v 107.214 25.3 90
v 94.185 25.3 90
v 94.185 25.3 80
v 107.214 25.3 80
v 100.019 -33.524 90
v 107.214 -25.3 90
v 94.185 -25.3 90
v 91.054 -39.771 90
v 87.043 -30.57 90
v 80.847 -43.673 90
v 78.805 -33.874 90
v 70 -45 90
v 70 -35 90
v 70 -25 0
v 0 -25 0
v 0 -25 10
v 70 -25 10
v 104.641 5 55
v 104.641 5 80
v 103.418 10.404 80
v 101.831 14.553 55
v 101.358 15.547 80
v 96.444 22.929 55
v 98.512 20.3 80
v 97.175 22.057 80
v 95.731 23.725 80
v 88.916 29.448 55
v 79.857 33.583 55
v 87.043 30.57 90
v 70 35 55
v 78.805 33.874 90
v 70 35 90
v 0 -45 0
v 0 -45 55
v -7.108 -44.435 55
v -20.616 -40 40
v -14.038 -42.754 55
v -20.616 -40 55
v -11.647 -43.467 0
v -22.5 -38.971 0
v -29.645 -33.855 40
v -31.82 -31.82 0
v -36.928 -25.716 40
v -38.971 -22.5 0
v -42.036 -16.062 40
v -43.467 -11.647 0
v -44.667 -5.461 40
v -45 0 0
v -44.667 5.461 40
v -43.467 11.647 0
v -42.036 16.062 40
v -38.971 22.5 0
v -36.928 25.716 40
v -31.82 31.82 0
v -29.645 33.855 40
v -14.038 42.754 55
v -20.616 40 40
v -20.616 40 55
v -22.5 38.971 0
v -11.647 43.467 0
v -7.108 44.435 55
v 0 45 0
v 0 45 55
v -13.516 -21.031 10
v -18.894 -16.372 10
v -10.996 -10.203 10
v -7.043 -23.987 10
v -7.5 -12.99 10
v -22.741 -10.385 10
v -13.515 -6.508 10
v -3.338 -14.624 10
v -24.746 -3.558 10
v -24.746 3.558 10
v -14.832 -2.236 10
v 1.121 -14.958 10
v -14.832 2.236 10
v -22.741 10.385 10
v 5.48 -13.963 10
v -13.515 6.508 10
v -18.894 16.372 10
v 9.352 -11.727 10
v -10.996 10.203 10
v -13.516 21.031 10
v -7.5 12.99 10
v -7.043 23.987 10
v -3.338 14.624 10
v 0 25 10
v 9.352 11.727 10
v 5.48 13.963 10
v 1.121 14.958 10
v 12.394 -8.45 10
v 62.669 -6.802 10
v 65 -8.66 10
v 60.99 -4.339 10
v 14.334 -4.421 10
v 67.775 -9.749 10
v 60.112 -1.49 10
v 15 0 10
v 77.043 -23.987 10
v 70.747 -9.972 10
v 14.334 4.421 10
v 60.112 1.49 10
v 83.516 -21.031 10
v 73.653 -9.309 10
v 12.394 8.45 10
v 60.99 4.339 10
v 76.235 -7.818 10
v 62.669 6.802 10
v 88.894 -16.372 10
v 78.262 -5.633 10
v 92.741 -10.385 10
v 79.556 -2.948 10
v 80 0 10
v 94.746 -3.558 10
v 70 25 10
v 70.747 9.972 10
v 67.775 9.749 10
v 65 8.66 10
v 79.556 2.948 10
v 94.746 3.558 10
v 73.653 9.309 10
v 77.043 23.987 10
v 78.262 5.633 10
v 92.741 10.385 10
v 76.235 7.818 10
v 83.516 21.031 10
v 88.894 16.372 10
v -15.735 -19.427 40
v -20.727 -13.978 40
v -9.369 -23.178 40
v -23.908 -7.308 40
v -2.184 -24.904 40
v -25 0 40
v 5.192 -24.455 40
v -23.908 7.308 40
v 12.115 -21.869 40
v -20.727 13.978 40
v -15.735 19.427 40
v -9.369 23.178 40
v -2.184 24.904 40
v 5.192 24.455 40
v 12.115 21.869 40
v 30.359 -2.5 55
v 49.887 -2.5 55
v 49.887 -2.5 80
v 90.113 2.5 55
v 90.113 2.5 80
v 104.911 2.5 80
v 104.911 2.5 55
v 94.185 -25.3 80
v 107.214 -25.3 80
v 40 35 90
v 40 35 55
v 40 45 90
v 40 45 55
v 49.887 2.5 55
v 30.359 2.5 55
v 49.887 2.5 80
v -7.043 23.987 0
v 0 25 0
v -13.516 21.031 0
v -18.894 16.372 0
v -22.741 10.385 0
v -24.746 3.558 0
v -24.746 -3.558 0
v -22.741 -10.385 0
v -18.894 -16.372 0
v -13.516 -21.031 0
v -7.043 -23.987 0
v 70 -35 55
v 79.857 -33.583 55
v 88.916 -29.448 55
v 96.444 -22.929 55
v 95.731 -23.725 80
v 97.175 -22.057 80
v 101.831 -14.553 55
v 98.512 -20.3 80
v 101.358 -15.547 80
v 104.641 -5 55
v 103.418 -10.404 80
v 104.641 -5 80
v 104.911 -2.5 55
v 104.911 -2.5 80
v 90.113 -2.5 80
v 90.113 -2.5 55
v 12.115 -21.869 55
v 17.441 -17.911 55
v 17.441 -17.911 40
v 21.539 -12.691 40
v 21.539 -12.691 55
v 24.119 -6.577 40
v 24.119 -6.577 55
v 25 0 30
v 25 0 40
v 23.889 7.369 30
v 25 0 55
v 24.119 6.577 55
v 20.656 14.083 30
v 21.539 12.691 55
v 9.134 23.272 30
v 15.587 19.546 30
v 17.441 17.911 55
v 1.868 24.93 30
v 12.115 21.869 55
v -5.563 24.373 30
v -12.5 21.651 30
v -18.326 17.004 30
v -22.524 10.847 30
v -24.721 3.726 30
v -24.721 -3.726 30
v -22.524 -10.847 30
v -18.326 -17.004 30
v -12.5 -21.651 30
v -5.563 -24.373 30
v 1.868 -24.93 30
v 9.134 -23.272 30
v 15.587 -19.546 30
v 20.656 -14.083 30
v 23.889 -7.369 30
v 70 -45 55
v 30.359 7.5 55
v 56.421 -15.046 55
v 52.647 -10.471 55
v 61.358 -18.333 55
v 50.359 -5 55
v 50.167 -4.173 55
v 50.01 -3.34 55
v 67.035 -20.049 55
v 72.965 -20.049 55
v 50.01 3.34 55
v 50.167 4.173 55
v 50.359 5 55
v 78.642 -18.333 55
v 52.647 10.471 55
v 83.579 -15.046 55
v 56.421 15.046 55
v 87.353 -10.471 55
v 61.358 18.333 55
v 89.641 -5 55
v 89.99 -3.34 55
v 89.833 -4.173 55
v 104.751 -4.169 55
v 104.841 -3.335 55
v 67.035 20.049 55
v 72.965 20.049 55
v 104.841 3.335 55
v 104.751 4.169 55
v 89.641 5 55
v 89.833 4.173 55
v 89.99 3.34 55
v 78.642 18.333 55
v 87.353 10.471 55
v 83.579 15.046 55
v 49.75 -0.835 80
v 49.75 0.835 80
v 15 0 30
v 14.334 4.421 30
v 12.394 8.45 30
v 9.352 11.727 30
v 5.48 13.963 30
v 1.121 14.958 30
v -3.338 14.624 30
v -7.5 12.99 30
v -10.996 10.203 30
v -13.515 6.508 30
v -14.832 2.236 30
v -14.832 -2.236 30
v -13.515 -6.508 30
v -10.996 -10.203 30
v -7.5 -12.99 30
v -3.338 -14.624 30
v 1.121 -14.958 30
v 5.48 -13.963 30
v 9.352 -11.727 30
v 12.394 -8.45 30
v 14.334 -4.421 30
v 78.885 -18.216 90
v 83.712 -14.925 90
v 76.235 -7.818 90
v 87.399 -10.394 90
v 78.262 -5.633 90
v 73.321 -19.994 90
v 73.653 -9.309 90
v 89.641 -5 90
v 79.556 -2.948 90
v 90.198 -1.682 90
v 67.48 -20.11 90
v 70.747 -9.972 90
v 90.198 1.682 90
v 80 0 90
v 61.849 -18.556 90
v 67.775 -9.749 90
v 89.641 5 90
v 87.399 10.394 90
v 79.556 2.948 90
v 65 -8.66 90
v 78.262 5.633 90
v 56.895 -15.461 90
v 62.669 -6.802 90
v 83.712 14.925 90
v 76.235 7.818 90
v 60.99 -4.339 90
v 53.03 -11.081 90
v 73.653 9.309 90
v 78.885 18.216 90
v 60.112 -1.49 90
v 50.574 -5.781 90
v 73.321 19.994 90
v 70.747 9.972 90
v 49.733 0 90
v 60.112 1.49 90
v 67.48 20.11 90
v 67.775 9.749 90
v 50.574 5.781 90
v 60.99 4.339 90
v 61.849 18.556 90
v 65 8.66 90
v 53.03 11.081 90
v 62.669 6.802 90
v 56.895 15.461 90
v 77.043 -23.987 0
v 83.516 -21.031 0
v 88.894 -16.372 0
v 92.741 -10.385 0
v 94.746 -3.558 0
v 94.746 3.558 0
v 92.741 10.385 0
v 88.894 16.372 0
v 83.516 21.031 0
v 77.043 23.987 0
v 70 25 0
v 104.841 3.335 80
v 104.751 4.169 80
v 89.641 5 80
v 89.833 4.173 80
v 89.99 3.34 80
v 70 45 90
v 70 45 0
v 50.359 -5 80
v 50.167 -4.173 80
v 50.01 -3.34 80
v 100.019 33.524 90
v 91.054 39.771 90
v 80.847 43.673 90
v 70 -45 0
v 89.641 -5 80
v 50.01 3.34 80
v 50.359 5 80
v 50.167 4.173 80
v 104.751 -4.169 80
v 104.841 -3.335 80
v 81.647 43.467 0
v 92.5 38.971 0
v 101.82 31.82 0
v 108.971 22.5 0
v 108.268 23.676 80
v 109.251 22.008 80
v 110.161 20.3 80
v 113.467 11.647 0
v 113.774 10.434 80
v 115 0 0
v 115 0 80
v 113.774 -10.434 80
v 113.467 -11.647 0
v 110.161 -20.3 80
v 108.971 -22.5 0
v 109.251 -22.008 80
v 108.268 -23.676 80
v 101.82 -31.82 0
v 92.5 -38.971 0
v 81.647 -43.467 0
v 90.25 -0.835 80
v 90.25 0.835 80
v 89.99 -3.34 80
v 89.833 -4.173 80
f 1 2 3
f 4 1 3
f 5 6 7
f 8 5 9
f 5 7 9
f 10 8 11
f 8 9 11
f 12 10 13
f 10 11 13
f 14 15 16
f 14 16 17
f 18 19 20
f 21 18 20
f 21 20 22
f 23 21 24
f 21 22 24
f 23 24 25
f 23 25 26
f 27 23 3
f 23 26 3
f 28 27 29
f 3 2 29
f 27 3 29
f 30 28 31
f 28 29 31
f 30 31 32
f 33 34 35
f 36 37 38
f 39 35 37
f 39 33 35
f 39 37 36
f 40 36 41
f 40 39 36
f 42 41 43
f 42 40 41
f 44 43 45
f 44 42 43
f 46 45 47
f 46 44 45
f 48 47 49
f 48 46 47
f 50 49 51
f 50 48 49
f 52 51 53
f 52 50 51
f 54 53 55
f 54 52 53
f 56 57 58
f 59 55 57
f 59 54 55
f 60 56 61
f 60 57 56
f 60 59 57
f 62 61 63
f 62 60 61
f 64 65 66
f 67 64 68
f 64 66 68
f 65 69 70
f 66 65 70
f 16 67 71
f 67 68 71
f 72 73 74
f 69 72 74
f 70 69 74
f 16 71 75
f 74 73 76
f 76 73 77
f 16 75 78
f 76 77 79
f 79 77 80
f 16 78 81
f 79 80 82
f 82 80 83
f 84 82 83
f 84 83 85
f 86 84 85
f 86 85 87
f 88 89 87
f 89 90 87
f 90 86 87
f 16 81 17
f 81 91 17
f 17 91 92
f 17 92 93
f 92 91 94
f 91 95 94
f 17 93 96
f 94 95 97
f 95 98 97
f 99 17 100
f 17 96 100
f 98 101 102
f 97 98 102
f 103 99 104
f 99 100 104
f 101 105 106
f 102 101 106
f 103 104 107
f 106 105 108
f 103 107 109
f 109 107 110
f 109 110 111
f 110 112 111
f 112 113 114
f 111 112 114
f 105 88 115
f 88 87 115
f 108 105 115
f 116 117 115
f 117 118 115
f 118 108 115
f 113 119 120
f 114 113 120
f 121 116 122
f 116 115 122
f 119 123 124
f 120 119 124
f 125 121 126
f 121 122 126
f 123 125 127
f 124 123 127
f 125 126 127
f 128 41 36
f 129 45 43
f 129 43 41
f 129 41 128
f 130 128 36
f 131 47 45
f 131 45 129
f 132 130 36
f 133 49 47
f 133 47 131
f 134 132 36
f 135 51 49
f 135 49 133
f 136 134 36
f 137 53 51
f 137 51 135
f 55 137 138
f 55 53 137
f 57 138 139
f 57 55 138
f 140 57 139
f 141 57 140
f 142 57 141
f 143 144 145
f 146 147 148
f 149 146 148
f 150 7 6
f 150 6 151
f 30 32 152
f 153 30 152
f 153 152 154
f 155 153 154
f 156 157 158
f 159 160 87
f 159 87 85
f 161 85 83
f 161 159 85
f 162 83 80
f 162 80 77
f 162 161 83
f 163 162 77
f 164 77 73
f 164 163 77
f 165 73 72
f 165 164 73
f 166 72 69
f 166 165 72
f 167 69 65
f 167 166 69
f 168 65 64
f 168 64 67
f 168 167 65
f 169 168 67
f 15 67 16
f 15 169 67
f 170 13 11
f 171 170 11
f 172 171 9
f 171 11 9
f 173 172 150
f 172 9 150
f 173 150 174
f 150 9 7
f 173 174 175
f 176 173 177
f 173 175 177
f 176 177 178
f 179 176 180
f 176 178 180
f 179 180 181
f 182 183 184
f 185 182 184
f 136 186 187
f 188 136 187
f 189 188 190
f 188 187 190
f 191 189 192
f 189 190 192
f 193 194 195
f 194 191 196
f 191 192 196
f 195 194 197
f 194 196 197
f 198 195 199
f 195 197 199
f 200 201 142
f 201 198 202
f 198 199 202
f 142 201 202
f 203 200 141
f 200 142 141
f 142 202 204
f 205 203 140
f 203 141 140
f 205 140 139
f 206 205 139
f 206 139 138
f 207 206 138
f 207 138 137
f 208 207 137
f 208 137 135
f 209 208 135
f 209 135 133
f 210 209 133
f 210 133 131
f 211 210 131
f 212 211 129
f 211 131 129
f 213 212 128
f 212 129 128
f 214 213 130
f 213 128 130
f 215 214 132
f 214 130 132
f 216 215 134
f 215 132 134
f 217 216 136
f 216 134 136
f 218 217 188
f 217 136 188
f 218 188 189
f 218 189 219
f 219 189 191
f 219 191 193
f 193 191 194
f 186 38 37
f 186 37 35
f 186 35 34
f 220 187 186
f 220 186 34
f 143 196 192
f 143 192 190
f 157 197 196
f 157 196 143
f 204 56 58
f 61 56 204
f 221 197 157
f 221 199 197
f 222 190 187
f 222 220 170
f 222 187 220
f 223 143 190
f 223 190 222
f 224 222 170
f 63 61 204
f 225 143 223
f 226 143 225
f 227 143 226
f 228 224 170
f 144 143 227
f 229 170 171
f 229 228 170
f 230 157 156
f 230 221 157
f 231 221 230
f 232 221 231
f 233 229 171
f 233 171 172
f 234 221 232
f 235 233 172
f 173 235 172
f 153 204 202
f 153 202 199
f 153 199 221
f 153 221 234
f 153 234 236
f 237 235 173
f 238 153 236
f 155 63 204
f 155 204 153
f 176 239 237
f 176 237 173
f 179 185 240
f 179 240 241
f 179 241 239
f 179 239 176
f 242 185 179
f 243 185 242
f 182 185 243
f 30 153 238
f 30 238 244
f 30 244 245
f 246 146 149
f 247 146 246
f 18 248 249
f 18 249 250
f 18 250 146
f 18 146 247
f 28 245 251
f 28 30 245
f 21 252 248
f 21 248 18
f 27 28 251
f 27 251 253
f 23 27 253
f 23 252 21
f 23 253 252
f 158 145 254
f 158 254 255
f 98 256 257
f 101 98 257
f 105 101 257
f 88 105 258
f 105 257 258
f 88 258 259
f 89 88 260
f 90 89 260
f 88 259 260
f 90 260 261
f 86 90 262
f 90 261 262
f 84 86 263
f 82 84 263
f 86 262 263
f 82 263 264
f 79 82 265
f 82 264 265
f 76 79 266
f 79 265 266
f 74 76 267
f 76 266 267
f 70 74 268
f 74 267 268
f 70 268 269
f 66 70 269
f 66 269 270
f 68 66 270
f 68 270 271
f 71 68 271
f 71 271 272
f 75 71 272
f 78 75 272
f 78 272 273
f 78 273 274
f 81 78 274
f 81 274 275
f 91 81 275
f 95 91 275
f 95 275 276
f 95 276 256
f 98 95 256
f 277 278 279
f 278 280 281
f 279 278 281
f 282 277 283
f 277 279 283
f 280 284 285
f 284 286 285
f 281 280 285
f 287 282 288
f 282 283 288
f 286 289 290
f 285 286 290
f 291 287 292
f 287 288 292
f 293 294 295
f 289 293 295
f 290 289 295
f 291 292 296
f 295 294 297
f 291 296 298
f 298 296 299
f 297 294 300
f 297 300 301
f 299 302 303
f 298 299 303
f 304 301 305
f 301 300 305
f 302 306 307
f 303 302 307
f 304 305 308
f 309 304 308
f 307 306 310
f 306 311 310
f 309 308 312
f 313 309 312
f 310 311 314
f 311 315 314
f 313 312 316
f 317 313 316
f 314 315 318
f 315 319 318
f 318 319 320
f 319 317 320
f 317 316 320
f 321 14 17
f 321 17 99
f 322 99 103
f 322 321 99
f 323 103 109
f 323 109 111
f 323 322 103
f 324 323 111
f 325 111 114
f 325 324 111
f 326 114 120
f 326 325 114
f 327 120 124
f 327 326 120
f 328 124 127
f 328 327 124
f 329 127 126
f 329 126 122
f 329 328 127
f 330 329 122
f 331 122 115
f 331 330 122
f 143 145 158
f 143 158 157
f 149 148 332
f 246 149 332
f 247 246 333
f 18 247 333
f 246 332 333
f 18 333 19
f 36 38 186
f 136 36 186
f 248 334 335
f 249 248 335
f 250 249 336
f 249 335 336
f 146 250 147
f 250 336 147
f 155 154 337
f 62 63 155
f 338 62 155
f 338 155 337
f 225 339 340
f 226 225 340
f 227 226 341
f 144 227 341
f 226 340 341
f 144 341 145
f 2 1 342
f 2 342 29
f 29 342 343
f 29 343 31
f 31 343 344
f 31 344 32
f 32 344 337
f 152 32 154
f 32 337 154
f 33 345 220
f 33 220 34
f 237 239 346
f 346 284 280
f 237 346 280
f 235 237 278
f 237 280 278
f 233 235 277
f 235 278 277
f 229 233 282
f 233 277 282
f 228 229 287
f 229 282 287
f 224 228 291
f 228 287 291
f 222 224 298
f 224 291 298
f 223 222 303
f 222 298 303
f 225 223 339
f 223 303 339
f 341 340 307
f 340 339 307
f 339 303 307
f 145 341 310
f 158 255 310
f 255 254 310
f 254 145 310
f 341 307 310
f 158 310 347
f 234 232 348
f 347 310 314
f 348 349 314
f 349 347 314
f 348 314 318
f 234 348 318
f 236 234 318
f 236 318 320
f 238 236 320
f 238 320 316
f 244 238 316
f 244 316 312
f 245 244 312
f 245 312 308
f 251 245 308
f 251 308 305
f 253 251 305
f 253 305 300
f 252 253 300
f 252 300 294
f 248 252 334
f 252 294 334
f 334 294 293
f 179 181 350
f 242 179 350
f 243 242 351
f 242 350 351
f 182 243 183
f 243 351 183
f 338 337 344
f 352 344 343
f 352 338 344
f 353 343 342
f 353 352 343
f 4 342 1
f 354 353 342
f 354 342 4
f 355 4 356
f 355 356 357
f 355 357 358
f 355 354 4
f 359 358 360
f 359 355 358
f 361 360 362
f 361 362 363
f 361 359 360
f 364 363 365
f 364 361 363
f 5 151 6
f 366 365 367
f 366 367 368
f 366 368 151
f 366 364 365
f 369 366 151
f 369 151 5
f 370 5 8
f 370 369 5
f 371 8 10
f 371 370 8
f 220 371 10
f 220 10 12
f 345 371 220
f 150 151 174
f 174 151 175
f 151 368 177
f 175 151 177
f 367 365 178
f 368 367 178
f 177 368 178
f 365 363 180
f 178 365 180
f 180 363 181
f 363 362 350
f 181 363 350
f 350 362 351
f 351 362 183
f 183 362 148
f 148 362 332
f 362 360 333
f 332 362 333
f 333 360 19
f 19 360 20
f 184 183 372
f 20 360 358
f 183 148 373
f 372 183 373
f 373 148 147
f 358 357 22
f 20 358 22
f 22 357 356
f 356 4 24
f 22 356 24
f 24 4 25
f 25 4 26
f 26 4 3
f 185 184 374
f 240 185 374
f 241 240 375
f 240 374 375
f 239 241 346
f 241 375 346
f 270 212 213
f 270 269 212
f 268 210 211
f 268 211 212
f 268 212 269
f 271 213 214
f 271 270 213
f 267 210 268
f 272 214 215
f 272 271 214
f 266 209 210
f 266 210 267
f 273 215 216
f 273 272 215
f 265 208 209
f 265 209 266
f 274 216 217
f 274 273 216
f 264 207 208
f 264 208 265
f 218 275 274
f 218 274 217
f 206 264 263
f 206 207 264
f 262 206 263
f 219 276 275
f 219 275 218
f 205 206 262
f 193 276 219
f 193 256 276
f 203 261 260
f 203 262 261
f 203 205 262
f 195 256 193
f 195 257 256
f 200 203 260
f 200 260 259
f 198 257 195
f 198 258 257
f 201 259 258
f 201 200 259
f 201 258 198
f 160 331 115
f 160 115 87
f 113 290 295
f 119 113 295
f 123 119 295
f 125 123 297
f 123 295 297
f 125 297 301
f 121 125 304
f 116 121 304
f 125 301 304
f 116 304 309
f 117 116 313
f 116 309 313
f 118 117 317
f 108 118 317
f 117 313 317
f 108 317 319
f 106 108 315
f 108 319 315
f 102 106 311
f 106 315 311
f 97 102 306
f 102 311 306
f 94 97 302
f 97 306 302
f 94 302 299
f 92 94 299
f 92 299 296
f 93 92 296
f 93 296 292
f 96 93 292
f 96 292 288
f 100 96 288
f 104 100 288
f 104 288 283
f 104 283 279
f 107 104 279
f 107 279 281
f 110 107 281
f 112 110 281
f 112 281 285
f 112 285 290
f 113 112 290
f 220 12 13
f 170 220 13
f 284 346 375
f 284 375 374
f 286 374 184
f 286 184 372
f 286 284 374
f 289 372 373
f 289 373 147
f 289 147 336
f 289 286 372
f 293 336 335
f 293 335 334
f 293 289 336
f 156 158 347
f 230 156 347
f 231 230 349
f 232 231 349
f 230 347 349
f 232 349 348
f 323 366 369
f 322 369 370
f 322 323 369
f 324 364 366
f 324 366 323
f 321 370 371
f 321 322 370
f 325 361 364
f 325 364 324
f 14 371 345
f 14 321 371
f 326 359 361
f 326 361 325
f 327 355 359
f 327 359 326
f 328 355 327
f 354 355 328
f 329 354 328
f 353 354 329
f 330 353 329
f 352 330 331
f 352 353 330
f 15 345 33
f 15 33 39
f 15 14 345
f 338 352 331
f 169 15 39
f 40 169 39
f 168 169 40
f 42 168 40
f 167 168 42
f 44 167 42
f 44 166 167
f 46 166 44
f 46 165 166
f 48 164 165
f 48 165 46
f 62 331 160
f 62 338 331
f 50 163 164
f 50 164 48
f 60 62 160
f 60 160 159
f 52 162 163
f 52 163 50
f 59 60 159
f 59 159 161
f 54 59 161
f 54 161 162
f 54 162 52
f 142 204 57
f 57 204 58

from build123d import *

# Parameters (mm, degrees)
BOSS_EXTRUDE1_DEPTH = 90
CUT_EXTRUDE1_DEPTH  = 10
SKETCH3_R           = 10
CUT_EXTRUDE2_DEPTH  = 166
SKETCH4_R           = 25
CUT_EXTRUDE3_DEPTH  = 50
SKETCH5_R           = 25
CUT_EXTRUDE4_DEPTH  = 10
SKETCH6_R           = 15
CUT_EXTRUDE5_DEPTH  = 148
CUT_EXTRUDE6_DEPTH  = 35
SKETCH8_W           = 10
SKETCH8_H           = 5
CUT_EXTRUDE7_DEPTH  = 145
SKETCH9_W           = 20
SKETCH9_H           = 10
BOSS_EXTRUDE2_DEPTH = 25
CUT_EXTRUDE8_DEPTH  = 10
CUT_EXTRUDE9_DEPTH  = 25
CUT_EXTRUDE10_DEPTH = 25
CUT_EXTRUDE11_DEPTH = 10


with BuildPart() as part:
    # Sketch1 → Boss-Extrude1 (new body)
    with BuildSketch(Plane.XY):
        with BuildLine():
            Line((0, 45), (70, 45))
            ThreePointArc((70, 45), (115, 0), (70, -45))
            Line((70, -45), (0, -45))
            ThreePointArc((0, -45), (-45, 0), (0, 45))
        make_face()
    extrude(amount=BOSS_EXTRUDE1_DEPTH)

    # Sketch2 → Cut-Extrude1 (cut)
    with BuildSketch(Plane(origin=(0, 0, 0), x_dir=(-1, 0, 0), z_dir=(0, 0, -1))):
        with BuildLine():
            Line((0, -25), (-70, -25))
            ThreePointArc((-70, -25), (-95, 0), (-70, 25))
            Line((-70, 25), (0, 25))
            ThreePointArc((0, 25), (25, 0), (0, -25))
        make_face()
    extrude(amount=-CUT_EXTRUDE1_DEPTH, mode=Mode.SUBTRACT)

    # Sketch3 → Cut-Extrude2 (cut)
    with BuildSketch(Plane.XY.offset(90)):
        with Locations((70, 0)):
            Circle(SKETCH3_R)
    extrude(amount=-CUT_EXTRUDE2_DEPTH, mode=Mode.SUBTRACT)

    # Sketch4 → Cut-Extrude3 (cut)
    with BuildSketch(Plane.XY.offset(90)):
        with BuildLine():
            ThreePointArc((12.114503105, -21.868671988), (-25, 0), (12.114503105, 21.868671988))
            Line((12.114503105, 21.868671988), (-20.615528128, 40))
            ThreePointArc((-20.615528128, 40), (-45, 0), (-20.615528128, -40))
            Line((-20.615528128, -40), (12.114503105, -21.868671988))
        make_face()
        Circle(SKETCH4_R)
    extrude(amount=-CUT_EXTRUDE3_DEPTH, mode=Mode.SUBTRACT)

    # Sketch5 → Cut-Extrude4 (cut)
    with BuildSketch(Plane.XY.offset(40)):
        Circle(SKETCH5_R)
    extrude(amount=-CUT_EXTRUDE4_DEPTH, mode=Mode.SUBTRACT)

    # Sketch6 → Cut-Extrude5 (cut)
    with BuildSketch(Plane.XY.offset(30)):
        Circle(SKETCH6_R)
    extrude(amount=-CUT_EXTRUDE5_DEPTH, mode=Mode.SUBTRACT)

    # Sketch7 → Cut-Extrude6 (cut)
    with BuildSketch(Plane.XY.offset(90)):
        with BuildLine():
            Line((40, 45), (0, 45))
            ThreePointArc((0, 45), (-10.606601718, 43.732139211), (-20.615528128, 40))
            Line((-20.615528128, 40), (12.114503105, 21.868671988))
            ThreePointArc((12.114503105, 21.868671988), (25, 0), (12.114503105, -21.868671988))
            Line((12.114503105, -21.868671988), (-20.615528128, -40))
            ThreePointArc((-20.615528128, -40), (-10.606601718, -43.732139211), (0, -45))
            Line((0, -45), (70, -45))
            Line((70, -45), (70, -35))
            ThreePointArc((70, -35), (92.912878475, -26.457513111), (104.641016151, -5))
            Line((104.641016151, -5), (89.641016151, -5))
            ThreePointArc((89.641016151, -5), (49.732550346, 0), (89.641016151, 5))
            Line((89.641016151, 5), (104.641016151, 5))
            ThreePointArc((104.641016151, 5), (92.912878475, 26.457513111), (70, 35))
            Line((70, 35), (40, 35))
            Line((40, 35), (40, 45))
        make_face()
    extrude(amount=-CUT_EXTRUDE6_DEPTH, mode=Mode.SUBTRACT)

    # Sketch8 → Cut-Extrude7 (cut)
    with BuildSketch(Plane(origin=(0, 0, 0), x_dir=(0, 0, -1), z_dir=(1, 0, 0))):
        with Locations((-85, 22.8)):
            Rectangle(SKETCH8_W, SKETCH8_H)
        with Locations((-85, -22.8)):
            Rectangle(SKETCH8_W, SKETCH8_H)
    extrude(amount=CUT_EXTRUDE7_DEPTH, mode=Mode.SUBTRACT)

    # Sketch9 → Boss-Extrude2 (add)
    with BuildSketch(Plane.XY.offset(55)):
        with Locations((40.358983849, 0)):
            Rectangle(SKETCH9_W, SKETCH9_H)
    extrude(amount=BOSS_EXTRUDE2_DEPTH)

    # Sketch10 → Cut-Extrude8 (cut)
    with BuildSketch(Plane.XY.offset(90)):
        with BuildLine():
            Line((89.641016151, 5), (104.641016151, 5))
            ThreePointArc((104.641016151, 5), (102.489767507, 13.015952033), (98.511576596, 20.3))
            Line((98.511576596, 20.3), (110.161050783, 20.3))
            ThreePointArc((110.161050783, 20.3), (115, 0), (110.161050783, -20.3))
            Line((110.161050783, -20.3), (98.511576596, -20.3))
            ThreePointArc((98.511576596, -20.3), (102.489767507, -13.015952033), (104.641016151, -5))
            Line((104.641016151, -5), (89.641016151, -5))
            ThreePointArc((89.641016151, -5), (90.267449654, 0), (89.641016151, 5))
        make_face()
    extrude(amount=-CUT_EXTRUDE8_DEPTH, mode=Mode.SUBTRACT)

    # Sketch11 → Cut-Extrude9 (cut)
    with BuildSketch(Plane.XY.offset(80)):
        with BuildLine():
            Line((49.88732948, -2.5), (30.358983849, -2.5))
            Line((30.358983849, -2.5), (30.358983849, -5))
            Line((30.358983849, -5), (50.358983849, -5))
            ThreePointArc((50.358983849, -5), (50.083890917, -3.757407944), (49.88732948, -2.5))
        make_face()
        with BuildLine():
            Line((50.358983849, 5), (30.358983849, 5))
            Line((30.358983849, 5), (30.358983849, 2.5))
            Line((30.358983849, 2.5), (49.88732948, 2.5))
            ThreePointArc((49.88732948, 2.5), (50.083890917, 3.757407944), (50.358983849, 5))
        make_face()
    extrude(amount=-CUT_EXTRUDE9_DEPTH, mode=Mode.SUBTRACT)

    # Sketch12 → Cut-Extrude10 (cut)
    with BuildSketch(Plane.XY.offset(80)):
        with BuildLine():
            Line((104.910600109, -2.5), (90.11267052, -2.5))
            ThreePointArc((90.11267052, -2.5), (89.916109083, -3.757407944), (89.641016151, -5))
            Line((89.641016151, -5), (104.641016151, -5))
            ThreePointArc((104.641016151, -5), (104.798266209, -3.752421735), (104.910600109, -2.5))
        make_face()
        with BuildLine():
            Line((104.641016151, 5), (89.641016151, 5))
            ThreePointArc((89.641016151, 5), (89.916109083, 3.757407944), (90.11267052, 2.5))
            Line((90.11267052, 2.5), (104.910600109, 2.5))
            ThreePointArc((104.910600109, 2.5), (104.798266209, 3.752421735), (104.641016151, 5))
        make_face()
    extrude(amount=-CUT_EXTRUDE10_DEPTH, mode=Mode.SUBTRACT)

    # Sketch13 → Cut-Extrude11 (cut)
    with BuildSketch(Plane.XZ.offset(2.5)):
        Polygon((49.88732948, 80), (30.358983849, 55), (30.358983849, 80), align=None)
    extrude(amount=-CUT_EXTRUDE11_DEPTH, mode=Mode.SUBTRACT)


solid = part.part
